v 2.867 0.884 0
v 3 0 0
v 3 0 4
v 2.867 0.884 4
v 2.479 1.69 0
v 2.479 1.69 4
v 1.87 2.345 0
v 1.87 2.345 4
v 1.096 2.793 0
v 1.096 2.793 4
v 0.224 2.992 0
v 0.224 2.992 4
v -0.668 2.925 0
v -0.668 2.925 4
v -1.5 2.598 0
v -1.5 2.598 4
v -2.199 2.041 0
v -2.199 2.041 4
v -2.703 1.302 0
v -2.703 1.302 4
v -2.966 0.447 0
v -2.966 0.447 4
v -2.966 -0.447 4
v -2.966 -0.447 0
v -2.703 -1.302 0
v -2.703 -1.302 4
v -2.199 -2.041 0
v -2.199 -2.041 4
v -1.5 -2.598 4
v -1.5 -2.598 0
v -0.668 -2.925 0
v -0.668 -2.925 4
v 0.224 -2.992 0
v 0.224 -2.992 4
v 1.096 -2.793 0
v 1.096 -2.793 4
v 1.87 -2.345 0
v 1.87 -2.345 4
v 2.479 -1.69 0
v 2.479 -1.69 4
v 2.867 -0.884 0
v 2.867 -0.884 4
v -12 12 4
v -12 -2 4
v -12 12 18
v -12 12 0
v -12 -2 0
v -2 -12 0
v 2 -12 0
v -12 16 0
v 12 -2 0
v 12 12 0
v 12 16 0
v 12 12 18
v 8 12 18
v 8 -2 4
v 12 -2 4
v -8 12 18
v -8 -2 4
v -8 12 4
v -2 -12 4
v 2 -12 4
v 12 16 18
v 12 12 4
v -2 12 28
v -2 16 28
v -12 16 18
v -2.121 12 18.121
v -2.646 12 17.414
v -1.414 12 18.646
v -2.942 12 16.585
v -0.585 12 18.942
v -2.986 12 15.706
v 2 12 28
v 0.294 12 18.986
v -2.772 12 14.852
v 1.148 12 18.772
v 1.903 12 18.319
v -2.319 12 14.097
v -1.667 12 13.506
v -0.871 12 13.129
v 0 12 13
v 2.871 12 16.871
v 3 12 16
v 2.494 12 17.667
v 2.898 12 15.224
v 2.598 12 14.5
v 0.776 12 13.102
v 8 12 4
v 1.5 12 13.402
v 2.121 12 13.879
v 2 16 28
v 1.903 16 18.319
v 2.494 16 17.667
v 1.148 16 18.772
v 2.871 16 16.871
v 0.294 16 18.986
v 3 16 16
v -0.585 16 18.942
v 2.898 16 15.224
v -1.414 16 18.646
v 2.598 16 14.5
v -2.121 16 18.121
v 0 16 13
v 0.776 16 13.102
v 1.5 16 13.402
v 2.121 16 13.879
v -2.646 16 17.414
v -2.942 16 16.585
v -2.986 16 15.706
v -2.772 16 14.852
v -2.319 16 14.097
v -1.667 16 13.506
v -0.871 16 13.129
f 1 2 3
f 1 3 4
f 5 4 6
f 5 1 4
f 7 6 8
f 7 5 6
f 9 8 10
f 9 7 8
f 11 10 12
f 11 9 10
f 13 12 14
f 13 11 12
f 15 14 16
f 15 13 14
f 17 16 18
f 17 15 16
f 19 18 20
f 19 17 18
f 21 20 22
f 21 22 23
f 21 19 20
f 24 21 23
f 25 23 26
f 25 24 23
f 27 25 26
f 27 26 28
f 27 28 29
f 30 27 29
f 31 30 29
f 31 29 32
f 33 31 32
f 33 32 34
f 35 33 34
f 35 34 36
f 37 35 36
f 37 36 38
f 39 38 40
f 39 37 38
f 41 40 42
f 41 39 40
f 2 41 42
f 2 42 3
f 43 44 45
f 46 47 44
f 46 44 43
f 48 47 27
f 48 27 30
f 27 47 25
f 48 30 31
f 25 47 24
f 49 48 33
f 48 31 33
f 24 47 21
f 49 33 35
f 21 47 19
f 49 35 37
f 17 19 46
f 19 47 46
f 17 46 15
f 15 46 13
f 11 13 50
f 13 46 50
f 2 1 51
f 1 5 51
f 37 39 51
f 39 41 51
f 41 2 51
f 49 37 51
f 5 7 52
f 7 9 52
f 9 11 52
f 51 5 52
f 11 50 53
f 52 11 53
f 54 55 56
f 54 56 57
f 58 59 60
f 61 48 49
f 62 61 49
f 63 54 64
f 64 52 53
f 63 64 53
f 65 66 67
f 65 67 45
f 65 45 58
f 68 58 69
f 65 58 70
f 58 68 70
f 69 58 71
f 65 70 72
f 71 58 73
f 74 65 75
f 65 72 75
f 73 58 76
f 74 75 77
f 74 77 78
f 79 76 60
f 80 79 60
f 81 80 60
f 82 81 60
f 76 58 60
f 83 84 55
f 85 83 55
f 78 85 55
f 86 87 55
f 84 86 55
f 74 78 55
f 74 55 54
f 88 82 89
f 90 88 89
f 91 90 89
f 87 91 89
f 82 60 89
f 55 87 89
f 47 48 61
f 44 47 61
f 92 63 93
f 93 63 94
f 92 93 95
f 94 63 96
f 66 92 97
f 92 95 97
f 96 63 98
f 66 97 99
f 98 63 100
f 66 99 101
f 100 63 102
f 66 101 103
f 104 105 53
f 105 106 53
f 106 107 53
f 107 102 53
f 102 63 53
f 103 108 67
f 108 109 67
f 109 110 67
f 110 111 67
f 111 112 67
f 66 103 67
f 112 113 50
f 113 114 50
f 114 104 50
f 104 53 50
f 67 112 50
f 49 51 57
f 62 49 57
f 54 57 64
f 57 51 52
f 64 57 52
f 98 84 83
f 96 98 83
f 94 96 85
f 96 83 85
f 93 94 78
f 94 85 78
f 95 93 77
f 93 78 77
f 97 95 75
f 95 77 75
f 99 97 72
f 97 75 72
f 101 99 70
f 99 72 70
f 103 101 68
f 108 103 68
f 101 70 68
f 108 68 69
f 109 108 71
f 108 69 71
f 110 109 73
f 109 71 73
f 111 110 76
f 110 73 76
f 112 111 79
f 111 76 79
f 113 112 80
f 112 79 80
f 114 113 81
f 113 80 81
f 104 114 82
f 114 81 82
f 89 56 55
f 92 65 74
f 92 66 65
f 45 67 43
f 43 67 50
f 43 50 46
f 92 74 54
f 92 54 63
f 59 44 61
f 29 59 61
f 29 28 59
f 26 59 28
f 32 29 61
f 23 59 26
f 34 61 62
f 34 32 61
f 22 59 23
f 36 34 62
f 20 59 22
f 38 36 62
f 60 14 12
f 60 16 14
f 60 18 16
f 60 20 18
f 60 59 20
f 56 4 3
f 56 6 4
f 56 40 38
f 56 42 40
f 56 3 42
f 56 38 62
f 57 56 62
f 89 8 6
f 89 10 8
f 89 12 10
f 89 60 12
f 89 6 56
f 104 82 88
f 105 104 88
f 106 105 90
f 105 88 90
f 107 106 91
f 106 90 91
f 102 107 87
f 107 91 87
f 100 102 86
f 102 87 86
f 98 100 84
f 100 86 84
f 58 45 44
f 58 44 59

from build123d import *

# Parameters (mm, degrees)
F0_W     = 24
F0_H     = 24
F0_R     = 3
F1_DEPTH = 4
F3_DEPTH = 28
F5_DEPTH = 25
F6_SIZE  = 10
F7_W     = 4
F7_H     = 14
F8_DEPTH = 14
F9_SIZE  = 13.99999


# Not quite as in the source:
# - a fillet or chamfer is up to 0.001 mm smaller than in the source, because OpenCascade refuses the exact size


with BuildPart() as f1:
    # F0 (on Top) → F1 (new body)
    with BuildSketch(Plane.XY):
        Rectangle(F0_W, F0_H)
        Circle(F0_R, mode=Mode.SUBTRACT)
    extrude(amount=F1_DEPTH)

    # F2 (on Top) → F3 (join)
    with BuildSketch(Plane.XY):
        Polygon((-12.0000001043, 12), (0, 12), (11.9999998957, 12), (11.9999998957, 16), (-12.0000001043, 16), align=None)
    extrude(amount=F3_DEPTH)

    # F4 (on face) → F5 (cut)
    with BuildSketch(Plane.XZ.offset(-12)):
        with BuildLine():
            ThreePointArc((0, 13), (2.1213203436, 13.8786796564), (3, 16))
            ThreePointArc((3, 16), (-2.1213203436, 18.1213203436), (0, 13))
        make_face()
    extrude(amount=-F5_DEPTH, mode=Mode.SUBTRACT)

    # F6
    f6_edges = [f1.edges().sort_by_distance(p)[0] for p in [
        (-12, -12, 2),
        (12, -12, 2),
        (-12, 14, 28),
        (12, 14, 28),
    ]]
    chamfer(f6_edges, length=F6_SIZE)

    # F7 (on face) → F8 (join)
    with BuildSketch(Plane.XY.offset(4)):
        with Locations((-10, 5)):
            Rectangle(F7_W, F7_H)
        with Locations((10, 5)):
            Rectangle(F7_W, F7_H)
    extrude(amount=F8_DEPTH)

    # F9 (size 14 in the source; OpenCascade refuses exactly that, so slightly less here)
    f9_edges = [f1.edges().sort_by_distance(p)[0] for p in [
        (-10, -2, 18),
        (10, -2, 18),
    ]]
    chamfer(f9_edges, length=F9_SIZE)


solid = f1.part
